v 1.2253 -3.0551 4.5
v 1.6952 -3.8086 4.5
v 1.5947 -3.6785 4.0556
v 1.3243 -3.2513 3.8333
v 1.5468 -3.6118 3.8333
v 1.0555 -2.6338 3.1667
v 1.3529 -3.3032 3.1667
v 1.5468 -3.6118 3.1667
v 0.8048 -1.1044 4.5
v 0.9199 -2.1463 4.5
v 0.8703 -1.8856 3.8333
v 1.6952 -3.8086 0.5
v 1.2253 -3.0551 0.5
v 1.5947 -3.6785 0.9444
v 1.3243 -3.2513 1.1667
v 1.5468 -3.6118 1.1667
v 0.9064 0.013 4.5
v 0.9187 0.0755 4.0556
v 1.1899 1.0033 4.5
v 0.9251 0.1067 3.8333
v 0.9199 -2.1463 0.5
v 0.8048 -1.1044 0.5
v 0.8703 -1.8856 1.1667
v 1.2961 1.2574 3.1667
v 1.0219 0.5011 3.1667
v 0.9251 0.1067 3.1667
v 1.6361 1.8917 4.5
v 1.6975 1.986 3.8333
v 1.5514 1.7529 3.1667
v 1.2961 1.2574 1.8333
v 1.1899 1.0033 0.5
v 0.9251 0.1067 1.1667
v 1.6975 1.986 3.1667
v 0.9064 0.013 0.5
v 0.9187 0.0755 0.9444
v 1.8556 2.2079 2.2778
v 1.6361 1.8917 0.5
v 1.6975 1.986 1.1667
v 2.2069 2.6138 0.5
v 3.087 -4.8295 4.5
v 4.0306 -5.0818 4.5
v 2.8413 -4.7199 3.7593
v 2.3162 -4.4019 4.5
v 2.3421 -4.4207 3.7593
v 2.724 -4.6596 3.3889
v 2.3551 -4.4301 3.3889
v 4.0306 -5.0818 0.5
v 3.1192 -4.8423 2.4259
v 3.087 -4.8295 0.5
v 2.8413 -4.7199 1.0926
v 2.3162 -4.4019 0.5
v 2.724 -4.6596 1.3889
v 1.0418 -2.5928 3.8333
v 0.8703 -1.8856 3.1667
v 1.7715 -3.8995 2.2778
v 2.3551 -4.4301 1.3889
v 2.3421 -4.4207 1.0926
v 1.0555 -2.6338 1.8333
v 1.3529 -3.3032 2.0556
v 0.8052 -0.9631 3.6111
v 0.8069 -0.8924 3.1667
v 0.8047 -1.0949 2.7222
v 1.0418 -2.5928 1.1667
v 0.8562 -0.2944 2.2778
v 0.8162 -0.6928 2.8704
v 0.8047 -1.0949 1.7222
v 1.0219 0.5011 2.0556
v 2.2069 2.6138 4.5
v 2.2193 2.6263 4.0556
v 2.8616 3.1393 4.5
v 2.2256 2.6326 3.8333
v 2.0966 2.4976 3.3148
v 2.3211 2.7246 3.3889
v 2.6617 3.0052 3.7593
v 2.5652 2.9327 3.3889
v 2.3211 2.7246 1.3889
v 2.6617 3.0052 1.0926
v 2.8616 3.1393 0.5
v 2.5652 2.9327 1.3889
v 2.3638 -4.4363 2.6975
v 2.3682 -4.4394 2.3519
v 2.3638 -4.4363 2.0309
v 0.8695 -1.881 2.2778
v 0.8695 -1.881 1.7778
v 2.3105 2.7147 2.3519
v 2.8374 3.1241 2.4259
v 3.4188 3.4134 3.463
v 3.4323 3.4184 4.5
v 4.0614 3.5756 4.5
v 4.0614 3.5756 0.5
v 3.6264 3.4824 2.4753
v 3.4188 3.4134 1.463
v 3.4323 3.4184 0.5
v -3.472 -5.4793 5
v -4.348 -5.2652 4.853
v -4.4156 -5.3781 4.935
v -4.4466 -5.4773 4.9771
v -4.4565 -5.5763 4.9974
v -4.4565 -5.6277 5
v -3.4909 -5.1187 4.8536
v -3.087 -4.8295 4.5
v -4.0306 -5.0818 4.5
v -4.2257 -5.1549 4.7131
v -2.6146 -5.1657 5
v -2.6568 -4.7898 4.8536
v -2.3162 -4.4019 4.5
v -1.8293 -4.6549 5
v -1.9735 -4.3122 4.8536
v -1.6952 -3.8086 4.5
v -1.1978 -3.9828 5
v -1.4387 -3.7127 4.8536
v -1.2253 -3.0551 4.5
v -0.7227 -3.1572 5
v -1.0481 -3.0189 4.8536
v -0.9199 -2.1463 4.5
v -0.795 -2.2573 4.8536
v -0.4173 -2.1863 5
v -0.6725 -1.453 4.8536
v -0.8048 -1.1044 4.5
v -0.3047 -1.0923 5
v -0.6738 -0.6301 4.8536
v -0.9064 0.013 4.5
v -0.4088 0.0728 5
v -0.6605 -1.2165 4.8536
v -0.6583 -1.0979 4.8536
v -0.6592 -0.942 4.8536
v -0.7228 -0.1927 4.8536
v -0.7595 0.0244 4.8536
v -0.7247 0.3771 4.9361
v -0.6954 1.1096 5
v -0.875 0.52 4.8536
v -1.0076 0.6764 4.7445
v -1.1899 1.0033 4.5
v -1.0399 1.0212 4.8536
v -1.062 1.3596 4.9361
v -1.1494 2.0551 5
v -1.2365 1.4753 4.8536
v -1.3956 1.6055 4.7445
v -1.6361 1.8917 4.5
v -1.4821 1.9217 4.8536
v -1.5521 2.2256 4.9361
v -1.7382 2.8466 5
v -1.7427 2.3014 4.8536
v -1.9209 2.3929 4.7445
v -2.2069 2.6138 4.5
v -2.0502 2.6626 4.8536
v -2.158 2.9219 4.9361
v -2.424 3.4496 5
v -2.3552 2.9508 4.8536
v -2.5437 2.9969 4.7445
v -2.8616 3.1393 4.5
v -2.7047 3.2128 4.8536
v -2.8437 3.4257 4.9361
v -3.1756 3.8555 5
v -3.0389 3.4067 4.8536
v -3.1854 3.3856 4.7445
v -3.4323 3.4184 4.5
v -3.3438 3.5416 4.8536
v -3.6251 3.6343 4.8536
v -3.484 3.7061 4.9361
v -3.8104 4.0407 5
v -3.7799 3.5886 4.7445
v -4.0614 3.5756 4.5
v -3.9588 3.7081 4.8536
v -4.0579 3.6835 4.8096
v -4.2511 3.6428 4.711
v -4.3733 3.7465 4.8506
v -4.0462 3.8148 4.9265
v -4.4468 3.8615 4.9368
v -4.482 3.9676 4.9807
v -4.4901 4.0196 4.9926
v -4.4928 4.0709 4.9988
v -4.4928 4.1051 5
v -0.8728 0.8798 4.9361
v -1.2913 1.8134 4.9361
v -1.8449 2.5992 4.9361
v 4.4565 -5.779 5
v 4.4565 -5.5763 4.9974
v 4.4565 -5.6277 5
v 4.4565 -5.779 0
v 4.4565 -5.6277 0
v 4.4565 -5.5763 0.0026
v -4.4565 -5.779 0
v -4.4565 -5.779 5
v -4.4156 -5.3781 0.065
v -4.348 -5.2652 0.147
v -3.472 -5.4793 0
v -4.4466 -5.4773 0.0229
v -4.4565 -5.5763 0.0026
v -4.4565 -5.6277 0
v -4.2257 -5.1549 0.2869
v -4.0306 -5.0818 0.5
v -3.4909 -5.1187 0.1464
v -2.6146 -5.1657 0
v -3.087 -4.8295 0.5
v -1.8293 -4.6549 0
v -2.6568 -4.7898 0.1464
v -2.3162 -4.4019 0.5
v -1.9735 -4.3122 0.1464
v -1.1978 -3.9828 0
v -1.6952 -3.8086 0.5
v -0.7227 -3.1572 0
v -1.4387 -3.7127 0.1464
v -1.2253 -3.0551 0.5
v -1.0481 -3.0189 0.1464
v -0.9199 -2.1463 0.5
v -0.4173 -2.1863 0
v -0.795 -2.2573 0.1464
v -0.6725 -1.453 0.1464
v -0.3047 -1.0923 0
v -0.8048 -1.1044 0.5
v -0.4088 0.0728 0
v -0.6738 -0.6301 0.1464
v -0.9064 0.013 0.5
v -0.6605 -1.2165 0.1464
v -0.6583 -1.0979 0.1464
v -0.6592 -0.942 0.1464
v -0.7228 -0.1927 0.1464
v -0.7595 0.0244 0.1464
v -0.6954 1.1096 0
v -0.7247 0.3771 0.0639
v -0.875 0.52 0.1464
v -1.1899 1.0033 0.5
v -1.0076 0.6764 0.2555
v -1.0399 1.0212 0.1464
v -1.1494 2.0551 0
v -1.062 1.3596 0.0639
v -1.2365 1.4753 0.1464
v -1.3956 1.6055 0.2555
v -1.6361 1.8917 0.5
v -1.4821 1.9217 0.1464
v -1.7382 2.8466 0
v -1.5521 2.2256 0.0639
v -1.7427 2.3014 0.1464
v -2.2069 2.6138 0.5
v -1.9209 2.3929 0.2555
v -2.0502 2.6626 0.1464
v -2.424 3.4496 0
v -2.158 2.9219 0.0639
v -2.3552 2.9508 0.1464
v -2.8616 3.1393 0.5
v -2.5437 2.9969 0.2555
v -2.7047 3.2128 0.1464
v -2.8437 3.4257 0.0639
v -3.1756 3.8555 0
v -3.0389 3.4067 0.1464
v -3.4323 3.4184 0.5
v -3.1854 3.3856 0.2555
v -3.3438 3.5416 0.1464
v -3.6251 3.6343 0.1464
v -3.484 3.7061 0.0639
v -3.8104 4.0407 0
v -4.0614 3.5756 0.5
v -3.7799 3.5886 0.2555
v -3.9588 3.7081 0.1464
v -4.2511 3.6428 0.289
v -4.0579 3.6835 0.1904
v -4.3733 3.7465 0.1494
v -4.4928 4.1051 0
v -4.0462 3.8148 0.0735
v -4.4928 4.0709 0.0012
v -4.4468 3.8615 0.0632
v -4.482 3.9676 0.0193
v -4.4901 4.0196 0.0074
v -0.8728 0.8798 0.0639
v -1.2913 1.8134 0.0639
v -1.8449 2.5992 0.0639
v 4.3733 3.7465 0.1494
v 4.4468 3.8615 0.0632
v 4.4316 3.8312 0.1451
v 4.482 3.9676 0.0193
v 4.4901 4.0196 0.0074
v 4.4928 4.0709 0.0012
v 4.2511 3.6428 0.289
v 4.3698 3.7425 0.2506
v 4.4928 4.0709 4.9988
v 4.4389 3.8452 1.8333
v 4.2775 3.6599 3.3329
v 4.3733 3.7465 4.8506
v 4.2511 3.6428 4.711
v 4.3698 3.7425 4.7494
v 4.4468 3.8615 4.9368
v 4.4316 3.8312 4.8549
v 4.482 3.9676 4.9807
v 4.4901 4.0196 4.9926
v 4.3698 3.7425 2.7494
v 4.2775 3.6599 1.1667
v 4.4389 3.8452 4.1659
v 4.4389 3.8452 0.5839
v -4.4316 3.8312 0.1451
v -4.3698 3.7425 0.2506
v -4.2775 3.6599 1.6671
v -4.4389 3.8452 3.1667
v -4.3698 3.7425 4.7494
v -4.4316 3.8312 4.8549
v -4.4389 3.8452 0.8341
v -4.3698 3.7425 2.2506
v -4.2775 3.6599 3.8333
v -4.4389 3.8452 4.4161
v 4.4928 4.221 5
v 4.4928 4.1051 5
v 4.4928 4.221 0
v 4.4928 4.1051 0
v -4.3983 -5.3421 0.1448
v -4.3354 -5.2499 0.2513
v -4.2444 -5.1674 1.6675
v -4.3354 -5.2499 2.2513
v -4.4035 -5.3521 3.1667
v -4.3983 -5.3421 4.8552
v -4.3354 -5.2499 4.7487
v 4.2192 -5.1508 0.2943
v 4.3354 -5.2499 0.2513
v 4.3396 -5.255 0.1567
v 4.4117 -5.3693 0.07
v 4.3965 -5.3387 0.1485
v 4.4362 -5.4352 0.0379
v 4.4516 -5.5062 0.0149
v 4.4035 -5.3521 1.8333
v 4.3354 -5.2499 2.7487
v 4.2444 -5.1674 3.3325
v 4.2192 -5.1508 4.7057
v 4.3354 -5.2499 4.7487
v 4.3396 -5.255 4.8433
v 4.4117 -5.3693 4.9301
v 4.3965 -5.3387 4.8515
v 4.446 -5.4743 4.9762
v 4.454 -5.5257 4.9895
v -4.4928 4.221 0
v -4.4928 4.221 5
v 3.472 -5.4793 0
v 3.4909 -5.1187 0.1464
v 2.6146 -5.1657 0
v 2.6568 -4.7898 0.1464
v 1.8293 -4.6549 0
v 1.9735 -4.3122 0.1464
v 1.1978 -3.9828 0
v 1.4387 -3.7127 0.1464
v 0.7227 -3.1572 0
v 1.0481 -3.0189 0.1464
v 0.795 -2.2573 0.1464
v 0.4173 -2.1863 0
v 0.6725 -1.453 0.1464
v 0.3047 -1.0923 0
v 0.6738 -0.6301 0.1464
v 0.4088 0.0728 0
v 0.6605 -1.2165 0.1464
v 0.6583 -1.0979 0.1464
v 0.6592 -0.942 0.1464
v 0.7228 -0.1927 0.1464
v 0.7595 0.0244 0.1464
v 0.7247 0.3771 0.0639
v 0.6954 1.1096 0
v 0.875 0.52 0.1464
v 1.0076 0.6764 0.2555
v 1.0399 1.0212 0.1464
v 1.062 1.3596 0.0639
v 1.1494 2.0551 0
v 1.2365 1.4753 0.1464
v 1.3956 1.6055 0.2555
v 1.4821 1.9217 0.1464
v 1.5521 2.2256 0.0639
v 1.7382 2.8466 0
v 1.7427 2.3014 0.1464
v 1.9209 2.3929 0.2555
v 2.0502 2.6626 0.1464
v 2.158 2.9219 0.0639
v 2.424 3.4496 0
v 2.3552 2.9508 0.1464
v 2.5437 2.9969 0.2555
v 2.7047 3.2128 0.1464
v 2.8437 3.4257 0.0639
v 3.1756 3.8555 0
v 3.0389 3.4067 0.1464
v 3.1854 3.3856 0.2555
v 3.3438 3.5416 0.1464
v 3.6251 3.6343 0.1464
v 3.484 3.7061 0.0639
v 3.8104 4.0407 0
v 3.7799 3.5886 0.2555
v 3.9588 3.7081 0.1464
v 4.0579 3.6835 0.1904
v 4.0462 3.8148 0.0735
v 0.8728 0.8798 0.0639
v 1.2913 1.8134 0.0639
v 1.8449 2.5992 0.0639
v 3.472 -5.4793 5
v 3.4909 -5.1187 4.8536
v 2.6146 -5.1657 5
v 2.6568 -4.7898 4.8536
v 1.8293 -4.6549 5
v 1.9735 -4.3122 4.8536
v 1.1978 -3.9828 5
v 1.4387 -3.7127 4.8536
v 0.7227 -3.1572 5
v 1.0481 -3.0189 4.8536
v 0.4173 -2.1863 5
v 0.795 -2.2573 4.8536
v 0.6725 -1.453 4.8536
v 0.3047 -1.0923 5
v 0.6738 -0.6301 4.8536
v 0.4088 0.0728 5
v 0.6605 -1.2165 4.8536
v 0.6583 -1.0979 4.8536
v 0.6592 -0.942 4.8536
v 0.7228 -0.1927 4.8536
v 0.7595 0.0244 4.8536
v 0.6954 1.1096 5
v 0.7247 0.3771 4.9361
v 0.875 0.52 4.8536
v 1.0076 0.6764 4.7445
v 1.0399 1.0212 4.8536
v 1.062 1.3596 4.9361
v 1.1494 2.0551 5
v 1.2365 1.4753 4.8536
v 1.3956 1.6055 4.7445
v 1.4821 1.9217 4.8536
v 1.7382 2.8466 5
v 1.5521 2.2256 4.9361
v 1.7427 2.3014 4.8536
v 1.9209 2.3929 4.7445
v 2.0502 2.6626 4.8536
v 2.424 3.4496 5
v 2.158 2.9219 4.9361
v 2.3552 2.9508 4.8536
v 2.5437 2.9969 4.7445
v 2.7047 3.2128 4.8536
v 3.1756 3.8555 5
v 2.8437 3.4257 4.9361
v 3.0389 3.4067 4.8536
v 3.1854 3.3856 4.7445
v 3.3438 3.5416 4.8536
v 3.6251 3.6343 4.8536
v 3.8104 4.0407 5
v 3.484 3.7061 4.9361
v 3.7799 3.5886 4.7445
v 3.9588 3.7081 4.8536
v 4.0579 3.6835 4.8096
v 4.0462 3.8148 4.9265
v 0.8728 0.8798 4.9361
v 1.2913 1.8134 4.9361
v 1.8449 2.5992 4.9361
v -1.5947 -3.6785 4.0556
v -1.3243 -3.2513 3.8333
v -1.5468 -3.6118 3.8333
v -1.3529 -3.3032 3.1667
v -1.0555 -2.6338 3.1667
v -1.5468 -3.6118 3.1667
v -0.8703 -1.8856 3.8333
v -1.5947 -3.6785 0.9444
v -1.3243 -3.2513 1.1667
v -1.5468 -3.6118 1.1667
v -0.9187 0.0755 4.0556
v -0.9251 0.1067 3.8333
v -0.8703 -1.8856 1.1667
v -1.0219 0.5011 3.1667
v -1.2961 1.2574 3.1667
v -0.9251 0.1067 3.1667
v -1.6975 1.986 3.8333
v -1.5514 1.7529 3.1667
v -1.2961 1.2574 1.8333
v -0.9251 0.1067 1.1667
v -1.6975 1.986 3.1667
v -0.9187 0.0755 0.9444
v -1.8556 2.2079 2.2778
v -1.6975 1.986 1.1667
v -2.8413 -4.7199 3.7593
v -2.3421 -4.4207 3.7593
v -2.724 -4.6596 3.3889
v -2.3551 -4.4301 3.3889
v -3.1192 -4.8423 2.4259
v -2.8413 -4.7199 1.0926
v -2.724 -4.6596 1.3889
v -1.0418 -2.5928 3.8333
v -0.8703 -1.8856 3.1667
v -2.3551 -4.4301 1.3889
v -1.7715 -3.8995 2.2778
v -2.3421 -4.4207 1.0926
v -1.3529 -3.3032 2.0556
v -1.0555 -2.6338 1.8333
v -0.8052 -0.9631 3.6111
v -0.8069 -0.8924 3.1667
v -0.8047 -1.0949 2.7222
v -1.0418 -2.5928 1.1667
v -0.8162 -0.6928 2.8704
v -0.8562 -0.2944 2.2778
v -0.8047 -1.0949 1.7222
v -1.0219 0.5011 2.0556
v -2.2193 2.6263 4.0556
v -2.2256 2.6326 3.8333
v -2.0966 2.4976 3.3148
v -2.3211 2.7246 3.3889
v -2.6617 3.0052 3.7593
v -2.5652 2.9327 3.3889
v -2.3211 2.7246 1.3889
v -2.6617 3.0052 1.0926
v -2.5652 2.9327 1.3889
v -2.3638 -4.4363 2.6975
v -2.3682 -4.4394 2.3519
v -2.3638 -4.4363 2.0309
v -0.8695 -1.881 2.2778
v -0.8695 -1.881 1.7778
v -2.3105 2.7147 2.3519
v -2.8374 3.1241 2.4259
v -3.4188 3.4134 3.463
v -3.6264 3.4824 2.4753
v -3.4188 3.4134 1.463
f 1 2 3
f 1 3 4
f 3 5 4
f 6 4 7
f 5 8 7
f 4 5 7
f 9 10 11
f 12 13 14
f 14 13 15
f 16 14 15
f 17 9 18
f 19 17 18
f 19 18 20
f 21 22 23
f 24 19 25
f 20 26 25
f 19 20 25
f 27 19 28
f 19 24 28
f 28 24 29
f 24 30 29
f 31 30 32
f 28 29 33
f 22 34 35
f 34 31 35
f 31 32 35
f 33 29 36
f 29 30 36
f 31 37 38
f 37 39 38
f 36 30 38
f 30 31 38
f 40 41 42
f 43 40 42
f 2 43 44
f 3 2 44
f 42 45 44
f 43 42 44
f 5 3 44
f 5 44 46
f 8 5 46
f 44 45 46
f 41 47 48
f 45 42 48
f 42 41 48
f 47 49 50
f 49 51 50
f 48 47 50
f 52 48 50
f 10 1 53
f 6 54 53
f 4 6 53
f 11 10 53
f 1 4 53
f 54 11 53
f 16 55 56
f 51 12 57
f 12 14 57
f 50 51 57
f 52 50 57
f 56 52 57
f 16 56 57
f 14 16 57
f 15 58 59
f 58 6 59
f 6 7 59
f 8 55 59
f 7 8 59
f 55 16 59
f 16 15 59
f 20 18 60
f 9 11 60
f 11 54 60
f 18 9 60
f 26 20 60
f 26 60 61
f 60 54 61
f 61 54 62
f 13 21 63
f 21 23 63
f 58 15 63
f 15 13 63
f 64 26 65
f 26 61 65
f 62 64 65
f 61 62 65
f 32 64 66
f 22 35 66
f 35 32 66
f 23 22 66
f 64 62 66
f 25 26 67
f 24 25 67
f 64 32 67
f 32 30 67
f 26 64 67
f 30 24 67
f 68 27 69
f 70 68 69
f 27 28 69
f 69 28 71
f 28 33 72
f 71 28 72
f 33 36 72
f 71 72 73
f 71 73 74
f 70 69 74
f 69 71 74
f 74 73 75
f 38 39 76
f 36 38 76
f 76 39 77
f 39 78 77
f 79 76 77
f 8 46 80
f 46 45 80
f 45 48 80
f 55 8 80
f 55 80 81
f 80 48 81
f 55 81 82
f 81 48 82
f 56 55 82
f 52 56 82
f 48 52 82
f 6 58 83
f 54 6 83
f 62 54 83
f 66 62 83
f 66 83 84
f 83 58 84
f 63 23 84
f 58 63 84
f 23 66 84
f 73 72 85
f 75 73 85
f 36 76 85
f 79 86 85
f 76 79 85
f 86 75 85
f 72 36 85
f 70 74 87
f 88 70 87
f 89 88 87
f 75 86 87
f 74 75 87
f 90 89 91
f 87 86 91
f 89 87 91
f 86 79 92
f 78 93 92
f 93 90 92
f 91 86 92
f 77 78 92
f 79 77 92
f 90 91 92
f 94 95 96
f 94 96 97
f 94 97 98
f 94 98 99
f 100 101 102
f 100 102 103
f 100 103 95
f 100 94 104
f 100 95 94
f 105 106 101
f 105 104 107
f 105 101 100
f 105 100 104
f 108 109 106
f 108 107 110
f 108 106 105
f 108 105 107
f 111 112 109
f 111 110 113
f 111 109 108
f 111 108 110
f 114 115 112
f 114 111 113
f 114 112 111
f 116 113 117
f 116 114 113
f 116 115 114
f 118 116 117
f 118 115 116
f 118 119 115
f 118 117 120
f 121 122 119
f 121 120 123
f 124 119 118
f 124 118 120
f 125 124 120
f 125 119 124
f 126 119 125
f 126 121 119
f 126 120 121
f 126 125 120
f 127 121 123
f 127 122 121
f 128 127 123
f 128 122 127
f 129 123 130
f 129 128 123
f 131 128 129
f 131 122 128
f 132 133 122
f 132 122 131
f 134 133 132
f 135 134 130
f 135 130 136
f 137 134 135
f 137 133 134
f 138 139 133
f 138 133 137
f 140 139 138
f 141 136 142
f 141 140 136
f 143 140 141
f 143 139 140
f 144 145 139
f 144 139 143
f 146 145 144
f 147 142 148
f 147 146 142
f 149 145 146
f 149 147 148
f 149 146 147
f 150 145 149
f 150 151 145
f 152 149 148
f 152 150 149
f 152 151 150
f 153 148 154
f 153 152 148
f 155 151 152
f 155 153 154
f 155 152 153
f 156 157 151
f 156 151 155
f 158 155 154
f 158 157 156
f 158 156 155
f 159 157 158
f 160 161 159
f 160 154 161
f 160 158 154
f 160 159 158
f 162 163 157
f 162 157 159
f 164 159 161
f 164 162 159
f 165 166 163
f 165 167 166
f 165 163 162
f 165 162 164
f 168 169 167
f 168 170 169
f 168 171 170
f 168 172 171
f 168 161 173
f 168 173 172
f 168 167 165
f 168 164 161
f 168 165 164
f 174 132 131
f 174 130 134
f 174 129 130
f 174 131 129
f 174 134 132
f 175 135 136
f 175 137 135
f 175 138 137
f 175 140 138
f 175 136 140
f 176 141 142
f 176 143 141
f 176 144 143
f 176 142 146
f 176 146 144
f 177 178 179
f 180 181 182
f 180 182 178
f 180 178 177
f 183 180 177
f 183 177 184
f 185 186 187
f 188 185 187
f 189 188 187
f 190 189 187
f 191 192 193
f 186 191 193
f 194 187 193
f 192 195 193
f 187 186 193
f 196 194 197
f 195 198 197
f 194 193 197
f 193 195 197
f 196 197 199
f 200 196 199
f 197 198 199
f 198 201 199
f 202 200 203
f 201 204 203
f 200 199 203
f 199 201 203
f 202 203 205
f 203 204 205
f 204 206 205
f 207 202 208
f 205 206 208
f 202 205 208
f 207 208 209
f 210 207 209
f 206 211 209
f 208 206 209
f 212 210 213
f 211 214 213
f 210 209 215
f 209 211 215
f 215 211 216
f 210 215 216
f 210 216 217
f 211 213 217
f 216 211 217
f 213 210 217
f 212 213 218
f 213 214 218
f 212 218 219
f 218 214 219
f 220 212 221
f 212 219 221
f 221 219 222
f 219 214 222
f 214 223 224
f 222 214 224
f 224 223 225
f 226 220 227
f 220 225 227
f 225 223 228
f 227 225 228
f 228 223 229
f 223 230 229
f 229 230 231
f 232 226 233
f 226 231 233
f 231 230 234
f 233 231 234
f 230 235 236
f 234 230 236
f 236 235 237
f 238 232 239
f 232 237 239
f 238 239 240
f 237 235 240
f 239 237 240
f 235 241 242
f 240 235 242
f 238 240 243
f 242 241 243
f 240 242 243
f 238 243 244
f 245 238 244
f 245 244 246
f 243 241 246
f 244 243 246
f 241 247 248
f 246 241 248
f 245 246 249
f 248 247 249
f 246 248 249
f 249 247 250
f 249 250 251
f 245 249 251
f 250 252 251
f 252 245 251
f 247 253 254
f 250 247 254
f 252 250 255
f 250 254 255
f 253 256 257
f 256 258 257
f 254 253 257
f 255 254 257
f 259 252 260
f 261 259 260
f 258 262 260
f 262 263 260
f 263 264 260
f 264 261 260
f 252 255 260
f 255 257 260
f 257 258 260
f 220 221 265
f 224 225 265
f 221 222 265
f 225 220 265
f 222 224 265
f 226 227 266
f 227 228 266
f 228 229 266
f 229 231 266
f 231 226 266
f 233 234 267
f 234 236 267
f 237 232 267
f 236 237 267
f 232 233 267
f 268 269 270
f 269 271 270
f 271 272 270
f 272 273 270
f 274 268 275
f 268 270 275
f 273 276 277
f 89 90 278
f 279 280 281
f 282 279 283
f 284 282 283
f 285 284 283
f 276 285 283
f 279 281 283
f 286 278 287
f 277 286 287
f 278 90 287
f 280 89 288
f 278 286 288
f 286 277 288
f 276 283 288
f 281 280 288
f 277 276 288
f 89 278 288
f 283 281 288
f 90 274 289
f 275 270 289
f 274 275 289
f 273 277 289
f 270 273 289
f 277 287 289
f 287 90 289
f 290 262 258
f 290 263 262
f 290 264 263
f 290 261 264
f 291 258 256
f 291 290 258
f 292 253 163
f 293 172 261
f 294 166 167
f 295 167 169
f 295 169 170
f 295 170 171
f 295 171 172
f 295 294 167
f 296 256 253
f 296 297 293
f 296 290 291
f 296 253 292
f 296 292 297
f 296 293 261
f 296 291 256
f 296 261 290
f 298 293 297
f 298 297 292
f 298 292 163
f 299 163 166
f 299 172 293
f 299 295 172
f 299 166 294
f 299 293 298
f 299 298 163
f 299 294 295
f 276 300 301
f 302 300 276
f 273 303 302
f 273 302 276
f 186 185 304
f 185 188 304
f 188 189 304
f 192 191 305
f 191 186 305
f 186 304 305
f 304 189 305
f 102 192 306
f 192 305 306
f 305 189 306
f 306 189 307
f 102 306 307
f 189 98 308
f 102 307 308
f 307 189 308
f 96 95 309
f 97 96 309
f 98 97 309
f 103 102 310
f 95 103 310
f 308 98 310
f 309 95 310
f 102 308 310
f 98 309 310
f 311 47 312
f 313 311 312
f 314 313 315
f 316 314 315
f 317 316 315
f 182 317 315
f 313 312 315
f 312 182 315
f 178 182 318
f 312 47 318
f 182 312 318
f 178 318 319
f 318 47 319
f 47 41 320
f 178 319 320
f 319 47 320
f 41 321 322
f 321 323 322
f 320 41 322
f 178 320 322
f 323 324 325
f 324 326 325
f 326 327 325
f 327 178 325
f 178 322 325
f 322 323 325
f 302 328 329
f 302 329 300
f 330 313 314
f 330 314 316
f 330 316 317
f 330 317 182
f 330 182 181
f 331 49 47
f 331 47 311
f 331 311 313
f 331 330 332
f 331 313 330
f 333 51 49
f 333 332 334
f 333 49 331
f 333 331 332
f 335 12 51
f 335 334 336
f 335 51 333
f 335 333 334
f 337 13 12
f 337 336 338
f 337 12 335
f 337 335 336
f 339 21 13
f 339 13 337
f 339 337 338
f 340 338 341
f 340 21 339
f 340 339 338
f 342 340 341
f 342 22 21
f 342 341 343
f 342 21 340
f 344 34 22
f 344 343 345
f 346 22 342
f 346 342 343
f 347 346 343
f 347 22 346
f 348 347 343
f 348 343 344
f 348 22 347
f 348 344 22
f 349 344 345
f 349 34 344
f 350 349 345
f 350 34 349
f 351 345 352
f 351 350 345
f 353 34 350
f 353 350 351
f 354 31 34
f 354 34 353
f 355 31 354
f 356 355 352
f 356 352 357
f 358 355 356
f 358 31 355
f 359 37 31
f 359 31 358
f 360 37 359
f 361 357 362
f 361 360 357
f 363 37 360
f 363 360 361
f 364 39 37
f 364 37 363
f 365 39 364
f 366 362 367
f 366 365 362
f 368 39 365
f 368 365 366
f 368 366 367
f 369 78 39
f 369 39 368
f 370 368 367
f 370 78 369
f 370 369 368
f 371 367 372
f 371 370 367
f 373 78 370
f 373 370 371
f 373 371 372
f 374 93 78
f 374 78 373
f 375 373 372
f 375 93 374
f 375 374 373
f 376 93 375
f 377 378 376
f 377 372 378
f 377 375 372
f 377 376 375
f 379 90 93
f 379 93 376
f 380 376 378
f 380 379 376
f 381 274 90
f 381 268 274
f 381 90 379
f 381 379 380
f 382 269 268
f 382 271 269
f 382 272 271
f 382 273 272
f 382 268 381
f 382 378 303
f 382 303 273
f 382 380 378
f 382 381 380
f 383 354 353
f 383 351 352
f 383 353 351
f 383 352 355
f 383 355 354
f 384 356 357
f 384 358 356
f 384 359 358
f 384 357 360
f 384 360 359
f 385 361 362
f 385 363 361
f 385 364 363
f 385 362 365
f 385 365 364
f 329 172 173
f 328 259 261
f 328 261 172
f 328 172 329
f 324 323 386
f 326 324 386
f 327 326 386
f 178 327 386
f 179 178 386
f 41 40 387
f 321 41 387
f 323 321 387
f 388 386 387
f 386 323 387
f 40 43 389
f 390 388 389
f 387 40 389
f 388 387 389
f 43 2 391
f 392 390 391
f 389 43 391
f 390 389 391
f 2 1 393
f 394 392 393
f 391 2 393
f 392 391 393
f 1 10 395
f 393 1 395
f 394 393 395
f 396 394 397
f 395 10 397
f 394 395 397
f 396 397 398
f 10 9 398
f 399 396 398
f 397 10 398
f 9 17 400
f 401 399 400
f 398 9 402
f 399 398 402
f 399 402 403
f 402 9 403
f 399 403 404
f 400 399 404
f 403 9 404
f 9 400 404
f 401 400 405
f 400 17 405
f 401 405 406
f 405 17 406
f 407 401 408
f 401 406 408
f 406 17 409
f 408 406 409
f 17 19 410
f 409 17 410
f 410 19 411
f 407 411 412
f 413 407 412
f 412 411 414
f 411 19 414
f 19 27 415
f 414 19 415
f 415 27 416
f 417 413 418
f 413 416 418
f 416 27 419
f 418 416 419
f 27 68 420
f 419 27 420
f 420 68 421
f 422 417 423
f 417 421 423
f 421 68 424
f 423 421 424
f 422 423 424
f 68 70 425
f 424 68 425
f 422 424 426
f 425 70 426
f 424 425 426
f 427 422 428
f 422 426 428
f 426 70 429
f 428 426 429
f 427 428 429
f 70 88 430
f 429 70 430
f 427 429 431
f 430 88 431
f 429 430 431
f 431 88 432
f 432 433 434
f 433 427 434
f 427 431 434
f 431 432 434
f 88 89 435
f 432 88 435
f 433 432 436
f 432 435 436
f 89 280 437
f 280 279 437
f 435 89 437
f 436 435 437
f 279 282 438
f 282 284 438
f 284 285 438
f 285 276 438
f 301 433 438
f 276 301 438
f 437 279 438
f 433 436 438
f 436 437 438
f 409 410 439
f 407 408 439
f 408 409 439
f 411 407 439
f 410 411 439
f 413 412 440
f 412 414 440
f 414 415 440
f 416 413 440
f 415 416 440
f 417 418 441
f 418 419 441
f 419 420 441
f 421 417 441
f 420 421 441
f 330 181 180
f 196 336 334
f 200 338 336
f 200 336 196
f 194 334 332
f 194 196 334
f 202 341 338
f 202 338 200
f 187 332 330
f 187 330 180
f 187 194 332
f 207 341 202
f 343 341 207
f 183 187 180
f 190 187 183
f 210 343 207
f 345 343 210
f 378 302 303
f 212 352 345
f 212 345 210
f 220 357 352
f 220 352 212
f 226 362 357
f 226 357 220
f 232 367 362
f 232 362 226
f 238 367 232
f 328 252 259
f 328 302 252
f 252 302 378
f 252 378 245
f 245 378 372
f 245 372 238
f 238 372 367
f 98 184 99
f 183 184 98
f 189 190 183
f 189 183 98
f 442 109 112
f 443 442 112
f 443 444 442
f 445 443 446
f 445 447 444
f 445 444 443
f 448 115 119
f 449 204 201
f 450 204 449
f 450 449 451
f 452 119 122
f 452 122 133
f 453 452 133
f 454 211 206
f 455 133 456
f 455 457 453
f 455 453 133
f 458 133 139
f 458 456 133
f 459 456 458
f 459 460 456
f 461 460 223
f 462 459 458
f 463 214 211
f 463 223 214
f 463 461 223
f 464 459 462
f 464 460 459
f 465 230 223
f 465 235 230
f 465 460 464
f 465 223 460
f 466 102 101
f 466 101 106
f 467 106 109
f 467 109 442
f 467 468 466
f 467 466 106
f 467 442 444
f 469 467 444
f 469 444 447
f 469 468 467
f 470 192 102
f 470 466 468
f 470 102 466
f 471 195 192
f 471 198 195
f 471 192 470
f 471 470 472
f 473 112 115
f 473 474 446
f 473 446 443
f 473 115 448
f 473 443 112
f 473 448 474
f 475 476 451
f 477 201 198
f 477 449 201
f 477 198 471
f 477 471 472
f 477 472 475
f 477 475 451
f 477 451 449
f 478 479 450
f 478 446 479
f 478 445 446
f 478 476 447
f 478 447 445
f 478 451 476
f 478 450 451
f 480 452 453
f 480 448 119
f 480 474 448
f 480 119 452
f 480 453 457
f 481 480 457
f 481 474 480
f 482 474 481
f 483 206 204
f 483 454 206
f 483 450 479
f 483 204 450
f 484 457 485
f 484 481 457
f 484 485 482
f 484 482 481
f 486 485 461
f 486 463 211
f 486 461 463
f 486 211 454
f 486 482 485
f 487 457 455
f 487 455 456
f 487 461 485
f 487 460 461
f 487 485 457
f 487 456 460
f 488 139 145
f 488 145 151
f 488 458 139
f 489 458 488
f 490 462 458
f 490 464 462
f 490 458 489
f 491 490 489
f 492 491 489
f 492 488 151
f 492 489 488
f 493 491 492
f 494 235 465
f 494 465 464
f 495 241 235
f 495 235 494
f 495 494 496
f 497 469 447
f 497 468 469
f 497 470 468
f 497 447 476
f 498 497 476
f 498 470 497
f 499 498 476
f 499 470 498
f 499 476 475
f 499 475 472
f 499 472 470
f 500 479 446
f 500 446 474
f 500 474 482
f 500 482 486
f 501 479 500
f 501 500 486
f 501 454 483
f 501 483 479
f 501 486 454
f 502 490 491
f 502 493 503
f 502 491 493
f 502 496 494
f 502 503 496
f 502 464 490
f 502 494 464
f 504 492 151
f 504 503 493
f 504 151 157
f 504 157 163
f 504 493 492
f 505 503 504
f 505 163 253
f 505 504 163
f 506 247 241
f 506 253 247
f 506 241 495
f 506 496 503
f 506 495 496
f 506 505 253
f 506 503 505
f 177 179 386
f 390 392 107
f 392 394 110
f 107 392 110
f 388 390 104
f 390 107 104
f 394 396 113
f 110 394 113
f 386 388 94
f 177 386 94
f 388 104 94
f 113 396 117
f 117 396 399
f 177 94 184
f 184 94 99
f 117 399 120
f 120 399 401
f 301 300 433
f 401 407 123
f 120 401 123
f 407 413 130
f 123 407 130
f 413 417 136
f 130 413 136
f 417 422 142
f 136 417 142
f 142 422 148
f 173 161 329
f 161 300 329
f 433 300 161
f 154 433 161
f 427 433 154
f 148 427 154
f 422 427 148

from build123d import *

# Parameters (mm, degrees)
BOSS_EXTRUDE1_DEPTH = 5
FILLET1_R           = 0.5


with BuildPart() as part:
    # Sketch1 → Boss-Extrude1 (new body)
    with BuildSketch(Plane.XY):
        with BuildLine():
            Line((-4.492753623, 3.605072464), (-4.492753623, 4.221014493))
            Line((-4.492753623, 4.221014493), (4.492753623, 4.221014493))
            Line((4.492753623, 4.221014493), (4.492753623, 3.605072464))
            add(Edge.make_bspline(
                [(4.456521739, -5.126811594), (-1.030105298, -4.776601358), (0.235507246, 3.605072464), (4.492753623, 3.605072464)],
                knots=[0, 0, 0, 0, 1, 1, 1, 1], degree=3))
            Line((4.456521739, -5.126811594), (4.456521739, -5.778985507))
            Line((4.456521739, -5.778985507), (-4.456521739, -5.778985507))
            Line((-4.456521739, -5.778985507), (-4.456521739, -5.126811594))
            add(Edge.make_bspline(
                [(-4.456521739, -5.126811594), (1.030105298, -4.776601358), (-0.235507246, 3.605072464), (-4.492753623, 3.605072464)],
                knots=[0, 0, 0, 0, 1, 1, 1, 1], degree=3))
        make_face()
    extrude(amount=BOSS_EXTRUDE1_DEPTH)

    # Fillet1
    fillet1_edges = [part.edges().sort_by_distance(p)[0] for p in [
        (-0.809667973, -0.814408993, 0),
        (-4.492753623, 3.605072464, 2.5),
        (4.492753623, 3.605072464, 2.5),
        (4.456521739, -5.126811594, 2.5),
        (-4.456521739, -5.126811594, 2.5),
        (0.809667973, -0.814408993, 5),
        (-0.809667973, -0.814408993, 5),
        (0.809667973, -0.814408993, 0),
    ]]
    fillet(fillet1_edges, radius=FILLET1_R)


solid = part.part
